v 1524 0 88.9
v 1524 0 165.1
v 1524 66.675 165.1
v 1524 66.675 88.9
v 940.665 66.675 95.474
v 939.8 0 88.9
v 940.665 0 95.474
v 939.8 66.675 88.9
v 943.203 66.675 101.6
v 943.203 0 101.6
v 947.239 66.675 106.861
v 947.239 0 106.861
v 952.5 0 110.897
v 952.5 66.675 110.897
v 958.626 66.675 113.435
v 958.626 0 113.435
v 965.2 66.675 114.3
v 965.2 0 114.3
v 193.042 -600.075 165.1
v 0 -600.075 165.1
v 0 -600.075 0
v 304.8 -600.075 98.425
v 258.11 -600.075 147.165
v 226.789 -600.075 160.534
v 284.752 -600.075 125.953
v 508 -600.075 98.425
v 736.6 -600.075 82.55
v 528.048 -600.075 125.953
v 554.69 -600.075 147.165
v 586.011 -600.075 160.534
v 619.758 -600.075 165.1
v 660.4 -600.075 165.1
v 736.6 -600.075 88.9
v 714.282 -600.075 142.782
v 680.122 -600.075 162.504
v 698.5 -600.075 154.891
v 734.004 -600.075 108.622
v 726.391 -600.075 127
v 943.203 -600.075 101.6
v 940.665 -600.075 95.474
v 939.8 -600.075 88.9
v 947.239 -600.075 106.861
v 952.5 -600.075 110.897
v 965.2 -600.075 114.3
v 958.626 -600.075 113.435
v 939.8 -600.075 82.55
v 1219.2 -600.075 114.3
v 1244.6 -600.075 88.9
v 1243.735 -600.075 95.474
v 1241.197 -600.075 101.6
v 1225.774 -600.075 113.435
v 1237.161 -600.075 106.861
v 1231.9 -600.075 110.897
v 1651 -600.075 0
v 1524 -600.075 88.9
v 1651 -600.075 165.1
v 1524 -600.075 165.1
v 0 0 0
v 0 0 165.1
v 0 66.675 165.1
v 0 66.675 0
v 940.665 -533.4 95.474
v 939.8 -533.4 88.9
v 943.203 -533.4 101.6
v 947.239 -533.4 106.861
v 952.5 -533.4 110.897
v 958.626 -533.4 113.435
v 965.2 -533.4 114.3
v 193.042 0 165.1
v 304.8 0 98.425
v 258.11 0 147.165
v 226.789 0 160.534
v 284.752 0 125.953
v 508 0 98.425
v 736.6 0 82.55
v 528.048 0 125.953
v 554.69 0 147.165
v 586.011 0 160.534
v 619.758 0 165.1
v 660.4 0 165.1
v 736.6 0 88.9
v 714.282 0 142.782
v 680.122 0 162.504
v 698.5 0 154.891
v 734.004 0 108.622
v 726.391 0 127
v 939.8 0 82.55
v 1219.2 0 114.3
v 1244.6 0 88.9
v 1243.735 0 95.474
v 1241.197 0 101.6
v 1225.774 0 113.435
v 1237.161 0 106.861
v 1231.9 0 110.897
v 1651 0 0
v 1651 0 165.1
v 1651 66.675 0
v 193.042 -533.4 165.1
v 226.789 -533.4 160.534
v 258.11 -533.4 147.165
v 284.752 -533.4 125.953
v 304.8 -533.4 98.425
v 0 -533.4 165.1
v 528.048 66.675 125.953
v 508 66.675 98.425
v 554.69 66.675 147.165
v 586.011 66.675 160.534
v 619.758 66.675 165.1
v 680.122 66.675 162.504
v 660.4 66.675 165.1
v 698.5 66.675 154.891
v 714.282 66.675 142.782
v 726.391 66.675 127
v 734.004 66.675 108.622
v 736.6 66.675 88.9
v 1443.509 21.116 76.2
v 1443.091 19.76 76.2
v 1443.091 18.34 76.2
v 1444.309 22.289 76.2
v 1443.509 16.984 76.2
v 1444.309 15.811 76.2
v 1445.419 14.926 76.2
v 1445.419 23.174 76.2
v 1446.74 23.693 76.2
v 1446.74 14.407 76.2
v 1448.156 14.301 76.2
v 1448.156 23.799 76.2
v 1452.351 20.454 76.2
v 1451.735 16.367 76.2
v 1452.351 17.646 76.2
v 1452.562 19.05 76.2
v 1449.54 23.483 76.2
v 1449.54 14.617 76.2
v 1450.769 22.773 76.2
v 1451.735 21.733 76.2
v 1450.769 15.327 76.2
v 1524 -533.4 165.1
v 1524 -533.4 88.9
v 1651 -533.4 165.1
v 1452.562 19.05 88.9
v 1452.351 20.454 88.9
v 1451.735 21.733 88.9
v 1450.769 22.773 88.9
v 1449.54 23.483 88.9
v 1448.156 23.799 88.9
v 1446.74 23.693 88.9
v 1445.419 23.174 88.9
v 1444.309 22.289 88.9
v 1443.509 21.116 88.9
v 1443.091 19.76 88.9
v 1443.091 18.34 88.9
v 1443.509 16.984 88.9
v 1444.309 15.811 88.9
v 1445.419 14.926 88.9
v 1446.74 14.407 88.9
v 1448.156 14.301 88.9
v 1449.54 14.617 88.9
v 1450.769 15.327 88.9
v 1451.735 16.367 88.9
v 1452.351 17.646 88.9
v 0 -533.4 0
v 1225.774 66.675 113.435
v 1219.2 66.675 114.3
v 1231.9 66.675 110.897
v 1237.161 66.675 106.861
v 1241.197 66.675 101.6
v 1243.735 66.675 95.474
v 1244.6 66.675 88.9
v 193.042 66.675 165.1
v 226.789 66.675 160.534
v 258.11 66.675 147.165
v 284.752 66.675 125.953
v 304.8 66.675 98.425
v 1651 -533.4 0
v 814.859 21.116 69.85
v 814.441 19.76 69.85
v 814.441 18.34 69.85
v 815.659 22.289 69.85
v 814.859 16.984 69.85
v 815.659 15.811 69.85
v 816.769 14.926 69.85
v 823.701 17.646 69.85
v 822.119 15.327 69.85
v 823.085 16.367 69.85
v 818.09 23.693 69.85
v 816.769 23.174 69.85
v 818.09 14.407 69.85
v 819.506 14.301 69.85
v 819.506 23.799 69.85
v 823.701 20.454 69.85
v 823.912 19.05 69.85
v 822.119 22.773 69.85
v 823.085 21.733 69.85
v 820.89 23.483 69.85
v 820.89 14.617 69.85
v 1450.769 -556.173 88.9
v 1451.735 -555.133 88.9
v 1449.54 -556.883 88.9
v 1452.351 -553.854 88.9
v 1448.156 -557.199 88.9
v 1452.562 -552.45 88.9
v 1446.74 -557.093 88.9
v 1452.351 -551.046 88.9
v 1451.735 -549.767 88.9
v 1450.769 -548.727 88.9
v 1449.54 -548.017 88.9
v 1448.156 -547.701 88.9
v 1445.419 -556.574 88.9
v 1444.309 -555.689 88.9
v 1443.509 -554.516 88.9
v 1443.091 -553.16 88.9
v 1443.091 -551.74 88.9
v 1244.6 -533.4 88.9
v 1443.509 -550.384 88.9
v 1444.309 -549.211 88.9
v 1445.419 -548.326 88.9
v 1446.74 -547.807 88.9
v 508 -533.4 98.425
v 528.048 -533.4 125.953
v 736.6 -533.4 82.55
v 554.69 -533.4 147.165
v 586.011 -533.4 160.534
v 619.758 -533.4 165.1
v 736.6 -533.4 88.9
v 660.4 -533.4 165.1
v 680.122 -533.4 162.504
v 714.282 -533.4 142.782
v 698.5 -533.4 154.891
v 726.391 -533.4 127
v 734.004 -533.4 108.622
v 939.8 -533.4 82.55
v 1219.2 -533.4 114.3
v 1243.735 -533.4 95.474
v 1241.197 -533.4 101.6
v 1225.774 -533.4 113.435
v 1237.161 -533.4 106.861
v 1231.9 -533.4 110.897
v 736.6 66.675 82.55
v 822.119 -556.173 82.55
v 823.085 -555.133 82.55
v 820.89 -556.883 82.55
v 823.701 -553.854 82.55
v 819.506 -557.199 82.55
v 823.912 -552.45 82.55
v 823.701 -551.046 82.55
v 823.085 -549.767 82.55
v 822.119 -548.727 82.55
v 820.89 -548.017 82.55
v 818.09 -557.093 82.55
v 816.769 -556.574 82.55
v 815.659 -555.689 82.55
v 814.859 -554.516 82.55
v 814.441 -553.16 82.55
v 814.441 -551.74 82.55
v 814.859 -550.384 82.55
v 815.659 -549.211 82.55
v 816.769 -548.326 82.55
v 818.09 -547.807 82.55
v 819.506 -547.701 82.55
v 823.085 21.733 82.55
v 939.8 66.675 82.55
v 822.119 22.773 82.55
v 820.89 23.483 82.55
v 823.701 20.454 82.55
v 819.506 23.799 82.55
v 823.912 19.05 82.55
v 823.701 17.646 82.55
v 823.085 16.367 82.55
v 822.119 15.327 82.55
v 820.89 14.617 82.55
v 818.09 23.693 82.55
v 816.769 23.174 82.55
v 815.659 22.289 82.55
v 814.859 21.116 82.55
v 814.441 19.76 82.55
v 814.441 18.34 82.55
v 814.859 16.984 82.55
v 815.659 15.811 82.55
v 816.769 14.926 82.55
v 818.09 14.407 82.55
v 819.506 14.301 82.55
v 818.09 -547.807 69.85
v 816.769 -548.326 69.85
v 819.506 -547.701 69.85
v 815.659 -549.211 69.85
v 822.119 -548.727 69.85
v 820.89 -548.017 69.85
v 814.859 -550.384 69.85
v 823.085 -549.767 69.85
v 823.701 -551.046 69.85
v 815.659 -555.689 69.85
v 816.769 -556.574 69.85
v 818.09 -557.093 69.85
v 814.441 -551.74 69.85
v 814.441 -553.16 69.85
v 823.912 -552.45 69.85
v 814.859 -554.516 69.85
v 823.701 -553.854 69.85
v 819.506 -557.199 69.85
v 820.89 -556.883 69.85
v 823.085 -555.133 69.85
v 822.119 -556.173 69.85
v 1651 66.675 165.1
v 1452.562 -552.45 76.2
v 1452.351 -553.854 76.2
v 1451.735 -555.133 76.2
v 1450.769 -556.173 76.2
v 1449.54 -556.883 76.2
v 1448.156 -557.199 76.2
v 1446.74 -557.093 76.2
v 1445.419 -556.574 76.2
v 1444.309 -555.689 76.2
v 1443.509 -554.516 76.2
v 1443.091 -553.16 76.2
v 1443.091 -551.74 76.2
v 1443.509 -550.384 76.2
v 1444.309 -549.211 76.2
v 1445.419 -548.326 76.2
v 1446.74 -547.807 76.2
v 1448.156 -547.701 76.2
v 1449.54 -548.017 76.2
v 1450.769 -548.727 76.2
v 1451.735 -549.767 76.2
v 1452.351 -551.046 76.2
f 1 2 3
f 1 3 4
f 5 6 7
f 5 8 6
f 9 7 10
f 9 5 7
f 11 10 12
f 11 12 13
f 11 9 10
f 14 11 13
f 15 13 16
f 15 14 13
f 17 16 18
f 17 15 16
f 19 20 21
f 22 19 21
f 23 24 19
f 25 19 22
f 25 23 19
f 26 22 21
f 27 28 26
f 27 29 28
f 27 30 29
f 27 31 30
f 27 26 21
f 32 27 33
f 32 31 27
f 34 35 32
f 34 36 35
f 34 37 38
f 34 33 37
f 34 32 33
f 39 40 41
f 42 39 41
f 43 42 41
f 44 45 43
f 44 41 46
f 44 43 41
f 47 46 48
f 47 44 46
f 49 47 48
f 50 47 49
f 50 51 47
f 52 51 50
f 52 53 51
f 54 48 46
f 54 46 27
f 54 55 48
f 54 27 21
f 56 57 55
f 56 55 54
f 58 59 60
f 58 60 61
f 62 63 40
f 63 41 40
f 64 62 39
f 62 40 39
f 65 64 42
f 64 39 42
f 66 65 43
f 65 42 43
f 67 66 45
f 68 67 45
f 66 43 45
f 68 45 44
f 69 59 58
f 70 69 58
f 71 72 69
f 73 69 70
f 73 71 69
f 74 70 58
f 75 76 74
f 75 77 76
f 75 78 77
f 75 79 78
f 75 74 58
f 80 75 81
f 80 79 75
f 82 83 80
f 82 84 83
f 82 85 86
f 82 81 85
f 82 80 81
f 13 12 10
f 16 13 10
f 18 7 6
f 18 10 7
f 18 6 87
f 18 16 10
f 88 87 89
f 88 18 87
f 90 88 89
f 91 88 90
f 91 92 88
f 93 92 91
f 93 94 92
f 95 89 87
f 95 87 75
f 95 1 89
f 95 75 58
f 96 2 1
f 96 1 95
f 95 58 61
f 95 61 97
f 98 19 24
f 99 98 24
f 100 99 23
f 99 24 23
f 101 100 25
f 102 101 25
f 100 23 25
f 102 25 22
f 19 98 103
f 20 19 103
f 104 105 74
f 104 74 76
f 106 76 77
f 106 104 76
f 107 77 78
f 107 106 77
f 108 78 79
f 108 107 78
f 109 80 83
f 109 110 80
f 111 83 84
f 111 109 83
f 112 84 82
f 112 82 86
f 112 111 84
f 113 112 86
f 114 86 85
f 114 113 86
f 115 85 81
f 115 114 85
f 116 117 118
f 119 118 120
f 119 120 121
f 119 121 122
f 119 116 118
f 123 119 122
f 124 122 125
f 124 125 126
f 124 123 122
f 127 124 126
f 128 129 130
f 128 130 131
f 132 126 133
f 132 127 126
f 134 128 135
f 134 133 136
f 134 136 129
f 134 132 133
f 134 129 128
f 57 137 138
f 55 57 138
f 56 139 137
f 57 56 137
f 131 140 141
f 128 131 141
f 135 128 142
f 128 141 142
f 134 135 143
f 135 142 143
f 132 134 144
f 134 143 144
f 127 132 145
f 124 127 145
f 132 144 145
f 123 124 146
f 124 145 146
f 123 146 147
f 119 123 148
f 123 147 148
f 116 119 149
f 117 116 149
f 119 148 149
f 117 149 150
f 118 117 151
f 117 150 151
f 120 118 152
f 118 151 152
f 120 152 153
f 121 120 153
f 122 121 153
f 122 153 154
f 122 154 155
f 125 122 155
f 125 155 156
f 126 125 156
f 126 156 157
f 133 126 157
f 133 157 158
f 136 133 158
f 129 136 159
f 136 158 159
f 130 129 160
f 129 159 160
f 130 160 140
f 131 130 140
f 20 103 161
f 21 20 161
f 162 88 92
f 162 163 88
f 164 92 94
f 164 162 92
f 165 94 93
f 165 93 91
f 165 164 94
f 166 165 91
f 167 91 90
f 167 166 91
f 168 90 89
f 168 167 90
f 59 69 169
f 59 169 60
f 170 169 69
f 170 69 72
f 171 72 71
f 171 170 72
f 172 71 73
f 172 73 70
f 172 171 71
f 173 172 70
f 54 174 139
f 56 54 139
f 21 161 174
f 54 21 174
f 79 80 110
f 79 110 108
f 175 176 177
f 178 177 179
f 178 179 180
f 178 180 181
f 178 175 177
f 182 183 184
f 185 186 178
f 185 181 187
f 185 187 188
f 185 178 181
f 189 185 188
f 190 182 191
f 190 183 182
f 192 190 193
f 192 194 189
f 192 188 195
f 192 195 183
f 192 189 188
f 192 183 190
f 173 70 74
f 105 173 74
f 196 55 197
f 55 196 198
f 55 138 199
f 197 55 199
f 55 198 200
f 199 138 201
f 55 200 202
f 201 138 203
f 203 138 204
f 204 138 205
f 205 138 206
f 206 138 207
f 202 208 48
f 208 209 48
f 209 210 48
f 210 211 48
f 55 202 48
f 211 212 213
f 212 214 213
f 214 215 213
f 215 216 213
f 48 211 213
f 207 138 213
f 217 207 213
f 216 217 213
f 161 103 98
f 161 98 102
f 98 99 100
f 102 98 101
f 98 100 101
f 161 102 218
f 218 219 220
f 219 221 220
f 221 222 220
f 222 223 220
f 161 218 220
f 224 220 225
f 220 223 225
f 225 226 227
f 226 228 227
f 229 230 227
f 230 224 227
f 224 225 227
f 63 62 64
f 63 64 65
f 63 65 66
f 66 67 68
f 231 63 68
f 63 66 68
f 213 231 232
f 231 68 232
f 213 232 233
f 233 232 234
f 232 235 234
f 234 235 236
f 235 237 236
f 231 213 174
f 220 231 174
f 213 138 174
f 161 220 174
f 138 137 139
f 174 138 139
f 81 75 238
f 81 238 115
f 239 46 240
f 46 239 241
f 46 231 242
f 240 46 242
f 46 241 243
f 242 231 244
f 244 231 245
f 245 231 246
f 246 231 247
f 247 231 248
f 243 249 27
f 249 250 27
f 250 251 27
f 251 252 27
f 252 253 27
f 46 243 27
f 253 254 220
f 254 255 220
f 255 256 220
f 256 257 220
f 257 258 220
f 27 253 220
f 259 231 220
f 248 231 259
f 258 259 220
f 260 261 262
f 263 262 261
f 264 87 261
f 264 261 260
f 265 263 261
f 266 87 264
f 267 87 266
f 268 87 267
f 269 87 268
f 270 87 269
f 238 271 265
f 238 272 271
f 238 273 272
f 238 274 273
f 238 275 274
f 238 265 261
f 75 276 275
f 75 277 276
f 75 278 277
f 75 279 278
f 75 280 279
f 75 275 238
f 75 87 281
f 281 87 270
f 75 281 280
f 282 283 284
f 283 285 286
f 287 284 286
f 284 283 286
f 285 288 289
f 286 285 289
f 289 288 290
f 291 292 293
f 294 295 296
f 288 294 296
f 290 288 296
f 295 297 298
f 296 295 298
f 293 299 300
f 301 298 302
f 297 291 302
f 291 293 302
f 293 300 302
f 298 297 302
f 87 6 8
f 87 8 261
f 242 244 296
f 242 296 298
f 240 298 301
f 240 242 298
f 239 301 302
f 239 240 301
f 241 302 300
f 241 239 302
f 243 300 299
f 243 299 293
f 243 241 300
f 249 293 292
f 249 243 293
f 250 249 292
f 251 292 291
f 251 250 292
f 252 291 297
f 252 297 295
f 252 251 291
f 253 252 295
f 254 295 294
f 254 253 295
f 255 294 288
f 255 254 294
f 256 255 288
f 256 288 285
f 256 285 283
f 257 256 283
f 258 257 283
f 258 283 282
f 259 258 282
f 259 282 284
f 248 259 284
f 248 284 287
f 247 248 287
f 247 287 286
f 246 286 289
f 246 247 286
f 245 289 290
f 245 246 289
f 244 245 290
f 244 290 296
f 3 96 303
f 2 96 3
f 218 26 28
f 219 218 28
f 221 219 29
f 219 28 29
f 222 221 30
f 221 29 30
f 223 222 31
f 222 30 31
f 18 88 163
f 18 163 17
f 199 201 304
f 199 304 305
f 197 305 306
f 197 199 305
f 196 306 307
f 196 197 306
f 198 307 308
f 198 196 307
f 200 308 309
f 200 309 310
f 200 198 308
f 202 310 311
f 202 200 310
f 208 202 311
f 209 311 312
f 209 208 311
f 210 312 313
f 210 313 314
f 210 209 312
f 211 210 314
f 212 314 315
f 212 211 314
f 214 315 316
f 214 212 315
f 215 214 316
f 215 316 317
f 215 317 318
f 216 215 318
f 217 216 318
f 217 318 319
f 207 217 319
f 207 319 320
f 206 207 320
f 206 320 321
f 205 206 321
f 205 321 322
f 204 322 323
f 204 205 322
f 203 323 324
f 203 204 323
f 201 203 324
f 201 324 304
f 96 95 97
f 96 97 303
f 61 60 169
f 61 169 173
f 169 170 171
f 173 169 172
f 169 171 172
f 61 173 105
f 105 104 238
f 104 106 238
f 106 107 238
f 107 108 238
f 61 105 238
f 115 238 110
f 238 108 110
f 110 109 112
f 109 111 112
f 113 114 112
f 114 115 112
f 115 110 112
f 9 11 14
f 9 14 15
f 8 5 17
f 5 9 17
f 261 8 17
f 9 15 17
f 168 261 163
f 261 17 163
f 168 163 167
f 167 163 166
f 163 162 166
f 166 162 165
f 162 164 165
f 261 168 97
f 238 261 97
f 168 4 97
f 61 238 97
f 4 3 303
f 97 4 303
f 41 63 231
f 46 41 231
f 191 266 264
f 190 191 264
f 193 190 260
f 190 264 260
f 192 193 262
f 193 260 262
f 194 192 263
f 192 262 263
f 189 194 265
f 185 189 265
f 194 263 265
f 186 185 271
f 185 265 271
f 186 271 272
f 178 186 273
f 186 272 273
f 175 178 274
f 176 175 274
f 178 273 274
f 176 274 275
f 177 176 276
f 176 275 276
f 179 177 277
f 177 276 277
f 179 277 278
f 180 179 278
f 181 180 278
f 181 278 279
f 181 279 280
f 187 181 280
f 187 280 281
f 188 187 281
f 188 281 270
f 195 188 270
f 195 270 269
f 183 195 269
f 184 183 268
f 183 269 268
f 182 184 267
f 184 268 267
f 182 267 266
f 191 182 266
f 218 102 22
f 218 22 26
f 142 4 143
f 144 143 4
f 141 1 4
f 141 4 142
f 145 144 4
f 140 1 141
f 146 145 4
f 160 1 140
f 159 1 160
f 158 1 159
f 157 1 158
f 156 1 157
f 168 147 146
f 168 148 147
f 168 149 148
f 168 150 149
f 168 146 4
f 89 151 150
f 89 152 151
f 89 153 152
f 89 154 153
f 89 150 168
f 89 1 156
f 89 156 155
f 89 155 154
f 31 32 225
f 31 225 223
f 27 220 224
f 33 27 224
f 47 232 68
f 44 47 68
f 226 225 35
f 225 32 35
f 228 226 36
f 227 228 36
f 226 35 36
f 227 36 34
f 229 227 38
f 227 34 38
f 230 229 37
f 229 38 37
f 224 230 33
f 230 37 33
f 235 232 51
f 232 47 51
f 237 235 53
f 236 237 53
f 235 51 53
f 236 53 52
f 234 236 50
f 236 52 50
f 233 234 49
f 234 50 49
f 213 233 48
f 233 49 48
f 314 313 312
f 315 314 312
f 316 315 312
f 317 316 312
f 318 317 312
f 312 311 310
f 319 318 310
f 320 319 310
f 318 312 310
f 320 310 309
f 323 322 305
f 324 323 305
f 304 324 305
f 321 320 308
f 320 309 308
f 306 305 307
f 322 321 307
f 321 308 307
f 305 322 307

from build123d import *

# Parameters (mm, degrees)
F1_DEPTH     = 66.675
F2_R         = 4.7625
F3_DEPTH     = 12.7
F4_R         = 4.7625
F5_DEPTH     = 12.7
F6_R         = 76.2
F7_R         = 25.39999
F10_W        = 203.2
F10_H        = 66.675
F11_DEPTH    = 66.676
F12_T1_DEPTH = 625.4659800408


# Not quite as in the source:
# - a fillet or chamfer that OpenCascade refuses, or shapes differently, is made with other operations: its cross-section is extruded or revolved along the edge and cut away or added
# - a fillet or chamfer is up to 0.001 mm smaller than in the source, because OpenCascade refuses the exact size


with BuildPart() as f1:
    # F0 (on Front) → F1 (new body)
    with BuildSketch(Plane.XZ):
        Polygon((0, 165.1), (0, 0), (1651, 0), (1651, 165.1), (1524, 165.1), (1524, 88.9), (1244.6, 88.9), (1244.6, 114.3), (939.8, 114.3), (939.8, 82.55), (736.6, 82.55), (736.6, 165.1), align=None)
    extrude(amount=-F1_DEPTH)

    # F2 (on face) → F3 (cut)
    with BuildSketch(Plane.XY.offset(82.55)):
        with Locations((819.15, 19.05)):
            Circle(F2_R)
    extrude(amount=-F3_DEPTH, mode=Mode.SUBTRACT)

    # F4 (on face) → F5 (cut)
    with BuildSketch(Plane.XY.offset(88.9)):
        with Locations((1447.8, 19.05)):
            Circle(F4_R)
    extrude(amount=-F5_DEPTH, mode=Mode.SUBTRACT)

    # F6
    f6_edges = [f1.edges().sort_by_distance(p)[0] for p in [
        (736.6, 33.3375, 165.1),
    ]]
    fillet(f6_edges, radius=F6_R)

    # F7 (radius 25.4 in the source; OpenCascade refuses exactly that, so slightly less here)
    f7_edges = [f1.edges().sort_by_distance(p)[0] for p in [
        (939.8, 33.3375, 114.3),
        (1244.6, 33.3375, 114.3),
    ]]
    fillet(f7_edges, radius=F7_R)


with BuildPart() as f9_1:
    # F9: instance of F1
    add(f1.part.mirror(Plane(origin=(751.1055710536, -266.7, 70.5390726634), x_dir=(1, 0, 0), z_dir=(0, -1, 0))))


with BuildPart() as f1_1:
    add(f1.part)

    # F10 (on face) → F11 (cut, through all)
    with BuildSketch(Plane.XZ):
        with Locations((406.4, 131.7625)):
            Rectangle(F10_W, F10_H)
    extrude(amount=-F11_DEPTH, mode=Mode.SUBTRACT)

    # F12: fillet of radius 127 on 2 edges, made by hand

    # F12_s2 → F12_t1 (cut)
    with BuildSketch(Plane.XZ.offset(-346.0704900204)):
        with BuildLine():
            ThreePointArc((193.0418039918, 165.1), (258.1099413557, 147.164831637), (304.8, 98.425))
            Line((304.8, 98.425), (304.8, 165.1))
            Line((304.8, 165.1), (193.0418039918, 165.1))
        make_face()
        with BuildLine():
            ThreePointArc((508, 98.425), (554.6900586443, 147.164831637), (619.7581960082, 165.1))
            Line((619.7581960082, 165.1), (508, 165.1))
            Line((508, 165.1), (508, 98.425))
        make_face()
    extrude(amount=F12_T1_DEPTH, mode=Mode.SUBTRACT)


with BuildPart() as f14_1:
    # F14: instance of F1
    add(f1_1.part.mirror(Plane(origin=(751.1055710536, -266.7, 70.5390726634), x_dir=(1, 0, 0), z_dir=(0, -1, 0))))


with BuildPart() as f16_1:
    # F16: instance of F1
    add(f1_1.part.mirror(Plane(origin=(751.1055710536, -266.7, 70.5390726634), x_dir=(1, 0, 0), z_dir=(0, -1, 0))))


solid = Compound([f1_1.part, f16_1.part])
